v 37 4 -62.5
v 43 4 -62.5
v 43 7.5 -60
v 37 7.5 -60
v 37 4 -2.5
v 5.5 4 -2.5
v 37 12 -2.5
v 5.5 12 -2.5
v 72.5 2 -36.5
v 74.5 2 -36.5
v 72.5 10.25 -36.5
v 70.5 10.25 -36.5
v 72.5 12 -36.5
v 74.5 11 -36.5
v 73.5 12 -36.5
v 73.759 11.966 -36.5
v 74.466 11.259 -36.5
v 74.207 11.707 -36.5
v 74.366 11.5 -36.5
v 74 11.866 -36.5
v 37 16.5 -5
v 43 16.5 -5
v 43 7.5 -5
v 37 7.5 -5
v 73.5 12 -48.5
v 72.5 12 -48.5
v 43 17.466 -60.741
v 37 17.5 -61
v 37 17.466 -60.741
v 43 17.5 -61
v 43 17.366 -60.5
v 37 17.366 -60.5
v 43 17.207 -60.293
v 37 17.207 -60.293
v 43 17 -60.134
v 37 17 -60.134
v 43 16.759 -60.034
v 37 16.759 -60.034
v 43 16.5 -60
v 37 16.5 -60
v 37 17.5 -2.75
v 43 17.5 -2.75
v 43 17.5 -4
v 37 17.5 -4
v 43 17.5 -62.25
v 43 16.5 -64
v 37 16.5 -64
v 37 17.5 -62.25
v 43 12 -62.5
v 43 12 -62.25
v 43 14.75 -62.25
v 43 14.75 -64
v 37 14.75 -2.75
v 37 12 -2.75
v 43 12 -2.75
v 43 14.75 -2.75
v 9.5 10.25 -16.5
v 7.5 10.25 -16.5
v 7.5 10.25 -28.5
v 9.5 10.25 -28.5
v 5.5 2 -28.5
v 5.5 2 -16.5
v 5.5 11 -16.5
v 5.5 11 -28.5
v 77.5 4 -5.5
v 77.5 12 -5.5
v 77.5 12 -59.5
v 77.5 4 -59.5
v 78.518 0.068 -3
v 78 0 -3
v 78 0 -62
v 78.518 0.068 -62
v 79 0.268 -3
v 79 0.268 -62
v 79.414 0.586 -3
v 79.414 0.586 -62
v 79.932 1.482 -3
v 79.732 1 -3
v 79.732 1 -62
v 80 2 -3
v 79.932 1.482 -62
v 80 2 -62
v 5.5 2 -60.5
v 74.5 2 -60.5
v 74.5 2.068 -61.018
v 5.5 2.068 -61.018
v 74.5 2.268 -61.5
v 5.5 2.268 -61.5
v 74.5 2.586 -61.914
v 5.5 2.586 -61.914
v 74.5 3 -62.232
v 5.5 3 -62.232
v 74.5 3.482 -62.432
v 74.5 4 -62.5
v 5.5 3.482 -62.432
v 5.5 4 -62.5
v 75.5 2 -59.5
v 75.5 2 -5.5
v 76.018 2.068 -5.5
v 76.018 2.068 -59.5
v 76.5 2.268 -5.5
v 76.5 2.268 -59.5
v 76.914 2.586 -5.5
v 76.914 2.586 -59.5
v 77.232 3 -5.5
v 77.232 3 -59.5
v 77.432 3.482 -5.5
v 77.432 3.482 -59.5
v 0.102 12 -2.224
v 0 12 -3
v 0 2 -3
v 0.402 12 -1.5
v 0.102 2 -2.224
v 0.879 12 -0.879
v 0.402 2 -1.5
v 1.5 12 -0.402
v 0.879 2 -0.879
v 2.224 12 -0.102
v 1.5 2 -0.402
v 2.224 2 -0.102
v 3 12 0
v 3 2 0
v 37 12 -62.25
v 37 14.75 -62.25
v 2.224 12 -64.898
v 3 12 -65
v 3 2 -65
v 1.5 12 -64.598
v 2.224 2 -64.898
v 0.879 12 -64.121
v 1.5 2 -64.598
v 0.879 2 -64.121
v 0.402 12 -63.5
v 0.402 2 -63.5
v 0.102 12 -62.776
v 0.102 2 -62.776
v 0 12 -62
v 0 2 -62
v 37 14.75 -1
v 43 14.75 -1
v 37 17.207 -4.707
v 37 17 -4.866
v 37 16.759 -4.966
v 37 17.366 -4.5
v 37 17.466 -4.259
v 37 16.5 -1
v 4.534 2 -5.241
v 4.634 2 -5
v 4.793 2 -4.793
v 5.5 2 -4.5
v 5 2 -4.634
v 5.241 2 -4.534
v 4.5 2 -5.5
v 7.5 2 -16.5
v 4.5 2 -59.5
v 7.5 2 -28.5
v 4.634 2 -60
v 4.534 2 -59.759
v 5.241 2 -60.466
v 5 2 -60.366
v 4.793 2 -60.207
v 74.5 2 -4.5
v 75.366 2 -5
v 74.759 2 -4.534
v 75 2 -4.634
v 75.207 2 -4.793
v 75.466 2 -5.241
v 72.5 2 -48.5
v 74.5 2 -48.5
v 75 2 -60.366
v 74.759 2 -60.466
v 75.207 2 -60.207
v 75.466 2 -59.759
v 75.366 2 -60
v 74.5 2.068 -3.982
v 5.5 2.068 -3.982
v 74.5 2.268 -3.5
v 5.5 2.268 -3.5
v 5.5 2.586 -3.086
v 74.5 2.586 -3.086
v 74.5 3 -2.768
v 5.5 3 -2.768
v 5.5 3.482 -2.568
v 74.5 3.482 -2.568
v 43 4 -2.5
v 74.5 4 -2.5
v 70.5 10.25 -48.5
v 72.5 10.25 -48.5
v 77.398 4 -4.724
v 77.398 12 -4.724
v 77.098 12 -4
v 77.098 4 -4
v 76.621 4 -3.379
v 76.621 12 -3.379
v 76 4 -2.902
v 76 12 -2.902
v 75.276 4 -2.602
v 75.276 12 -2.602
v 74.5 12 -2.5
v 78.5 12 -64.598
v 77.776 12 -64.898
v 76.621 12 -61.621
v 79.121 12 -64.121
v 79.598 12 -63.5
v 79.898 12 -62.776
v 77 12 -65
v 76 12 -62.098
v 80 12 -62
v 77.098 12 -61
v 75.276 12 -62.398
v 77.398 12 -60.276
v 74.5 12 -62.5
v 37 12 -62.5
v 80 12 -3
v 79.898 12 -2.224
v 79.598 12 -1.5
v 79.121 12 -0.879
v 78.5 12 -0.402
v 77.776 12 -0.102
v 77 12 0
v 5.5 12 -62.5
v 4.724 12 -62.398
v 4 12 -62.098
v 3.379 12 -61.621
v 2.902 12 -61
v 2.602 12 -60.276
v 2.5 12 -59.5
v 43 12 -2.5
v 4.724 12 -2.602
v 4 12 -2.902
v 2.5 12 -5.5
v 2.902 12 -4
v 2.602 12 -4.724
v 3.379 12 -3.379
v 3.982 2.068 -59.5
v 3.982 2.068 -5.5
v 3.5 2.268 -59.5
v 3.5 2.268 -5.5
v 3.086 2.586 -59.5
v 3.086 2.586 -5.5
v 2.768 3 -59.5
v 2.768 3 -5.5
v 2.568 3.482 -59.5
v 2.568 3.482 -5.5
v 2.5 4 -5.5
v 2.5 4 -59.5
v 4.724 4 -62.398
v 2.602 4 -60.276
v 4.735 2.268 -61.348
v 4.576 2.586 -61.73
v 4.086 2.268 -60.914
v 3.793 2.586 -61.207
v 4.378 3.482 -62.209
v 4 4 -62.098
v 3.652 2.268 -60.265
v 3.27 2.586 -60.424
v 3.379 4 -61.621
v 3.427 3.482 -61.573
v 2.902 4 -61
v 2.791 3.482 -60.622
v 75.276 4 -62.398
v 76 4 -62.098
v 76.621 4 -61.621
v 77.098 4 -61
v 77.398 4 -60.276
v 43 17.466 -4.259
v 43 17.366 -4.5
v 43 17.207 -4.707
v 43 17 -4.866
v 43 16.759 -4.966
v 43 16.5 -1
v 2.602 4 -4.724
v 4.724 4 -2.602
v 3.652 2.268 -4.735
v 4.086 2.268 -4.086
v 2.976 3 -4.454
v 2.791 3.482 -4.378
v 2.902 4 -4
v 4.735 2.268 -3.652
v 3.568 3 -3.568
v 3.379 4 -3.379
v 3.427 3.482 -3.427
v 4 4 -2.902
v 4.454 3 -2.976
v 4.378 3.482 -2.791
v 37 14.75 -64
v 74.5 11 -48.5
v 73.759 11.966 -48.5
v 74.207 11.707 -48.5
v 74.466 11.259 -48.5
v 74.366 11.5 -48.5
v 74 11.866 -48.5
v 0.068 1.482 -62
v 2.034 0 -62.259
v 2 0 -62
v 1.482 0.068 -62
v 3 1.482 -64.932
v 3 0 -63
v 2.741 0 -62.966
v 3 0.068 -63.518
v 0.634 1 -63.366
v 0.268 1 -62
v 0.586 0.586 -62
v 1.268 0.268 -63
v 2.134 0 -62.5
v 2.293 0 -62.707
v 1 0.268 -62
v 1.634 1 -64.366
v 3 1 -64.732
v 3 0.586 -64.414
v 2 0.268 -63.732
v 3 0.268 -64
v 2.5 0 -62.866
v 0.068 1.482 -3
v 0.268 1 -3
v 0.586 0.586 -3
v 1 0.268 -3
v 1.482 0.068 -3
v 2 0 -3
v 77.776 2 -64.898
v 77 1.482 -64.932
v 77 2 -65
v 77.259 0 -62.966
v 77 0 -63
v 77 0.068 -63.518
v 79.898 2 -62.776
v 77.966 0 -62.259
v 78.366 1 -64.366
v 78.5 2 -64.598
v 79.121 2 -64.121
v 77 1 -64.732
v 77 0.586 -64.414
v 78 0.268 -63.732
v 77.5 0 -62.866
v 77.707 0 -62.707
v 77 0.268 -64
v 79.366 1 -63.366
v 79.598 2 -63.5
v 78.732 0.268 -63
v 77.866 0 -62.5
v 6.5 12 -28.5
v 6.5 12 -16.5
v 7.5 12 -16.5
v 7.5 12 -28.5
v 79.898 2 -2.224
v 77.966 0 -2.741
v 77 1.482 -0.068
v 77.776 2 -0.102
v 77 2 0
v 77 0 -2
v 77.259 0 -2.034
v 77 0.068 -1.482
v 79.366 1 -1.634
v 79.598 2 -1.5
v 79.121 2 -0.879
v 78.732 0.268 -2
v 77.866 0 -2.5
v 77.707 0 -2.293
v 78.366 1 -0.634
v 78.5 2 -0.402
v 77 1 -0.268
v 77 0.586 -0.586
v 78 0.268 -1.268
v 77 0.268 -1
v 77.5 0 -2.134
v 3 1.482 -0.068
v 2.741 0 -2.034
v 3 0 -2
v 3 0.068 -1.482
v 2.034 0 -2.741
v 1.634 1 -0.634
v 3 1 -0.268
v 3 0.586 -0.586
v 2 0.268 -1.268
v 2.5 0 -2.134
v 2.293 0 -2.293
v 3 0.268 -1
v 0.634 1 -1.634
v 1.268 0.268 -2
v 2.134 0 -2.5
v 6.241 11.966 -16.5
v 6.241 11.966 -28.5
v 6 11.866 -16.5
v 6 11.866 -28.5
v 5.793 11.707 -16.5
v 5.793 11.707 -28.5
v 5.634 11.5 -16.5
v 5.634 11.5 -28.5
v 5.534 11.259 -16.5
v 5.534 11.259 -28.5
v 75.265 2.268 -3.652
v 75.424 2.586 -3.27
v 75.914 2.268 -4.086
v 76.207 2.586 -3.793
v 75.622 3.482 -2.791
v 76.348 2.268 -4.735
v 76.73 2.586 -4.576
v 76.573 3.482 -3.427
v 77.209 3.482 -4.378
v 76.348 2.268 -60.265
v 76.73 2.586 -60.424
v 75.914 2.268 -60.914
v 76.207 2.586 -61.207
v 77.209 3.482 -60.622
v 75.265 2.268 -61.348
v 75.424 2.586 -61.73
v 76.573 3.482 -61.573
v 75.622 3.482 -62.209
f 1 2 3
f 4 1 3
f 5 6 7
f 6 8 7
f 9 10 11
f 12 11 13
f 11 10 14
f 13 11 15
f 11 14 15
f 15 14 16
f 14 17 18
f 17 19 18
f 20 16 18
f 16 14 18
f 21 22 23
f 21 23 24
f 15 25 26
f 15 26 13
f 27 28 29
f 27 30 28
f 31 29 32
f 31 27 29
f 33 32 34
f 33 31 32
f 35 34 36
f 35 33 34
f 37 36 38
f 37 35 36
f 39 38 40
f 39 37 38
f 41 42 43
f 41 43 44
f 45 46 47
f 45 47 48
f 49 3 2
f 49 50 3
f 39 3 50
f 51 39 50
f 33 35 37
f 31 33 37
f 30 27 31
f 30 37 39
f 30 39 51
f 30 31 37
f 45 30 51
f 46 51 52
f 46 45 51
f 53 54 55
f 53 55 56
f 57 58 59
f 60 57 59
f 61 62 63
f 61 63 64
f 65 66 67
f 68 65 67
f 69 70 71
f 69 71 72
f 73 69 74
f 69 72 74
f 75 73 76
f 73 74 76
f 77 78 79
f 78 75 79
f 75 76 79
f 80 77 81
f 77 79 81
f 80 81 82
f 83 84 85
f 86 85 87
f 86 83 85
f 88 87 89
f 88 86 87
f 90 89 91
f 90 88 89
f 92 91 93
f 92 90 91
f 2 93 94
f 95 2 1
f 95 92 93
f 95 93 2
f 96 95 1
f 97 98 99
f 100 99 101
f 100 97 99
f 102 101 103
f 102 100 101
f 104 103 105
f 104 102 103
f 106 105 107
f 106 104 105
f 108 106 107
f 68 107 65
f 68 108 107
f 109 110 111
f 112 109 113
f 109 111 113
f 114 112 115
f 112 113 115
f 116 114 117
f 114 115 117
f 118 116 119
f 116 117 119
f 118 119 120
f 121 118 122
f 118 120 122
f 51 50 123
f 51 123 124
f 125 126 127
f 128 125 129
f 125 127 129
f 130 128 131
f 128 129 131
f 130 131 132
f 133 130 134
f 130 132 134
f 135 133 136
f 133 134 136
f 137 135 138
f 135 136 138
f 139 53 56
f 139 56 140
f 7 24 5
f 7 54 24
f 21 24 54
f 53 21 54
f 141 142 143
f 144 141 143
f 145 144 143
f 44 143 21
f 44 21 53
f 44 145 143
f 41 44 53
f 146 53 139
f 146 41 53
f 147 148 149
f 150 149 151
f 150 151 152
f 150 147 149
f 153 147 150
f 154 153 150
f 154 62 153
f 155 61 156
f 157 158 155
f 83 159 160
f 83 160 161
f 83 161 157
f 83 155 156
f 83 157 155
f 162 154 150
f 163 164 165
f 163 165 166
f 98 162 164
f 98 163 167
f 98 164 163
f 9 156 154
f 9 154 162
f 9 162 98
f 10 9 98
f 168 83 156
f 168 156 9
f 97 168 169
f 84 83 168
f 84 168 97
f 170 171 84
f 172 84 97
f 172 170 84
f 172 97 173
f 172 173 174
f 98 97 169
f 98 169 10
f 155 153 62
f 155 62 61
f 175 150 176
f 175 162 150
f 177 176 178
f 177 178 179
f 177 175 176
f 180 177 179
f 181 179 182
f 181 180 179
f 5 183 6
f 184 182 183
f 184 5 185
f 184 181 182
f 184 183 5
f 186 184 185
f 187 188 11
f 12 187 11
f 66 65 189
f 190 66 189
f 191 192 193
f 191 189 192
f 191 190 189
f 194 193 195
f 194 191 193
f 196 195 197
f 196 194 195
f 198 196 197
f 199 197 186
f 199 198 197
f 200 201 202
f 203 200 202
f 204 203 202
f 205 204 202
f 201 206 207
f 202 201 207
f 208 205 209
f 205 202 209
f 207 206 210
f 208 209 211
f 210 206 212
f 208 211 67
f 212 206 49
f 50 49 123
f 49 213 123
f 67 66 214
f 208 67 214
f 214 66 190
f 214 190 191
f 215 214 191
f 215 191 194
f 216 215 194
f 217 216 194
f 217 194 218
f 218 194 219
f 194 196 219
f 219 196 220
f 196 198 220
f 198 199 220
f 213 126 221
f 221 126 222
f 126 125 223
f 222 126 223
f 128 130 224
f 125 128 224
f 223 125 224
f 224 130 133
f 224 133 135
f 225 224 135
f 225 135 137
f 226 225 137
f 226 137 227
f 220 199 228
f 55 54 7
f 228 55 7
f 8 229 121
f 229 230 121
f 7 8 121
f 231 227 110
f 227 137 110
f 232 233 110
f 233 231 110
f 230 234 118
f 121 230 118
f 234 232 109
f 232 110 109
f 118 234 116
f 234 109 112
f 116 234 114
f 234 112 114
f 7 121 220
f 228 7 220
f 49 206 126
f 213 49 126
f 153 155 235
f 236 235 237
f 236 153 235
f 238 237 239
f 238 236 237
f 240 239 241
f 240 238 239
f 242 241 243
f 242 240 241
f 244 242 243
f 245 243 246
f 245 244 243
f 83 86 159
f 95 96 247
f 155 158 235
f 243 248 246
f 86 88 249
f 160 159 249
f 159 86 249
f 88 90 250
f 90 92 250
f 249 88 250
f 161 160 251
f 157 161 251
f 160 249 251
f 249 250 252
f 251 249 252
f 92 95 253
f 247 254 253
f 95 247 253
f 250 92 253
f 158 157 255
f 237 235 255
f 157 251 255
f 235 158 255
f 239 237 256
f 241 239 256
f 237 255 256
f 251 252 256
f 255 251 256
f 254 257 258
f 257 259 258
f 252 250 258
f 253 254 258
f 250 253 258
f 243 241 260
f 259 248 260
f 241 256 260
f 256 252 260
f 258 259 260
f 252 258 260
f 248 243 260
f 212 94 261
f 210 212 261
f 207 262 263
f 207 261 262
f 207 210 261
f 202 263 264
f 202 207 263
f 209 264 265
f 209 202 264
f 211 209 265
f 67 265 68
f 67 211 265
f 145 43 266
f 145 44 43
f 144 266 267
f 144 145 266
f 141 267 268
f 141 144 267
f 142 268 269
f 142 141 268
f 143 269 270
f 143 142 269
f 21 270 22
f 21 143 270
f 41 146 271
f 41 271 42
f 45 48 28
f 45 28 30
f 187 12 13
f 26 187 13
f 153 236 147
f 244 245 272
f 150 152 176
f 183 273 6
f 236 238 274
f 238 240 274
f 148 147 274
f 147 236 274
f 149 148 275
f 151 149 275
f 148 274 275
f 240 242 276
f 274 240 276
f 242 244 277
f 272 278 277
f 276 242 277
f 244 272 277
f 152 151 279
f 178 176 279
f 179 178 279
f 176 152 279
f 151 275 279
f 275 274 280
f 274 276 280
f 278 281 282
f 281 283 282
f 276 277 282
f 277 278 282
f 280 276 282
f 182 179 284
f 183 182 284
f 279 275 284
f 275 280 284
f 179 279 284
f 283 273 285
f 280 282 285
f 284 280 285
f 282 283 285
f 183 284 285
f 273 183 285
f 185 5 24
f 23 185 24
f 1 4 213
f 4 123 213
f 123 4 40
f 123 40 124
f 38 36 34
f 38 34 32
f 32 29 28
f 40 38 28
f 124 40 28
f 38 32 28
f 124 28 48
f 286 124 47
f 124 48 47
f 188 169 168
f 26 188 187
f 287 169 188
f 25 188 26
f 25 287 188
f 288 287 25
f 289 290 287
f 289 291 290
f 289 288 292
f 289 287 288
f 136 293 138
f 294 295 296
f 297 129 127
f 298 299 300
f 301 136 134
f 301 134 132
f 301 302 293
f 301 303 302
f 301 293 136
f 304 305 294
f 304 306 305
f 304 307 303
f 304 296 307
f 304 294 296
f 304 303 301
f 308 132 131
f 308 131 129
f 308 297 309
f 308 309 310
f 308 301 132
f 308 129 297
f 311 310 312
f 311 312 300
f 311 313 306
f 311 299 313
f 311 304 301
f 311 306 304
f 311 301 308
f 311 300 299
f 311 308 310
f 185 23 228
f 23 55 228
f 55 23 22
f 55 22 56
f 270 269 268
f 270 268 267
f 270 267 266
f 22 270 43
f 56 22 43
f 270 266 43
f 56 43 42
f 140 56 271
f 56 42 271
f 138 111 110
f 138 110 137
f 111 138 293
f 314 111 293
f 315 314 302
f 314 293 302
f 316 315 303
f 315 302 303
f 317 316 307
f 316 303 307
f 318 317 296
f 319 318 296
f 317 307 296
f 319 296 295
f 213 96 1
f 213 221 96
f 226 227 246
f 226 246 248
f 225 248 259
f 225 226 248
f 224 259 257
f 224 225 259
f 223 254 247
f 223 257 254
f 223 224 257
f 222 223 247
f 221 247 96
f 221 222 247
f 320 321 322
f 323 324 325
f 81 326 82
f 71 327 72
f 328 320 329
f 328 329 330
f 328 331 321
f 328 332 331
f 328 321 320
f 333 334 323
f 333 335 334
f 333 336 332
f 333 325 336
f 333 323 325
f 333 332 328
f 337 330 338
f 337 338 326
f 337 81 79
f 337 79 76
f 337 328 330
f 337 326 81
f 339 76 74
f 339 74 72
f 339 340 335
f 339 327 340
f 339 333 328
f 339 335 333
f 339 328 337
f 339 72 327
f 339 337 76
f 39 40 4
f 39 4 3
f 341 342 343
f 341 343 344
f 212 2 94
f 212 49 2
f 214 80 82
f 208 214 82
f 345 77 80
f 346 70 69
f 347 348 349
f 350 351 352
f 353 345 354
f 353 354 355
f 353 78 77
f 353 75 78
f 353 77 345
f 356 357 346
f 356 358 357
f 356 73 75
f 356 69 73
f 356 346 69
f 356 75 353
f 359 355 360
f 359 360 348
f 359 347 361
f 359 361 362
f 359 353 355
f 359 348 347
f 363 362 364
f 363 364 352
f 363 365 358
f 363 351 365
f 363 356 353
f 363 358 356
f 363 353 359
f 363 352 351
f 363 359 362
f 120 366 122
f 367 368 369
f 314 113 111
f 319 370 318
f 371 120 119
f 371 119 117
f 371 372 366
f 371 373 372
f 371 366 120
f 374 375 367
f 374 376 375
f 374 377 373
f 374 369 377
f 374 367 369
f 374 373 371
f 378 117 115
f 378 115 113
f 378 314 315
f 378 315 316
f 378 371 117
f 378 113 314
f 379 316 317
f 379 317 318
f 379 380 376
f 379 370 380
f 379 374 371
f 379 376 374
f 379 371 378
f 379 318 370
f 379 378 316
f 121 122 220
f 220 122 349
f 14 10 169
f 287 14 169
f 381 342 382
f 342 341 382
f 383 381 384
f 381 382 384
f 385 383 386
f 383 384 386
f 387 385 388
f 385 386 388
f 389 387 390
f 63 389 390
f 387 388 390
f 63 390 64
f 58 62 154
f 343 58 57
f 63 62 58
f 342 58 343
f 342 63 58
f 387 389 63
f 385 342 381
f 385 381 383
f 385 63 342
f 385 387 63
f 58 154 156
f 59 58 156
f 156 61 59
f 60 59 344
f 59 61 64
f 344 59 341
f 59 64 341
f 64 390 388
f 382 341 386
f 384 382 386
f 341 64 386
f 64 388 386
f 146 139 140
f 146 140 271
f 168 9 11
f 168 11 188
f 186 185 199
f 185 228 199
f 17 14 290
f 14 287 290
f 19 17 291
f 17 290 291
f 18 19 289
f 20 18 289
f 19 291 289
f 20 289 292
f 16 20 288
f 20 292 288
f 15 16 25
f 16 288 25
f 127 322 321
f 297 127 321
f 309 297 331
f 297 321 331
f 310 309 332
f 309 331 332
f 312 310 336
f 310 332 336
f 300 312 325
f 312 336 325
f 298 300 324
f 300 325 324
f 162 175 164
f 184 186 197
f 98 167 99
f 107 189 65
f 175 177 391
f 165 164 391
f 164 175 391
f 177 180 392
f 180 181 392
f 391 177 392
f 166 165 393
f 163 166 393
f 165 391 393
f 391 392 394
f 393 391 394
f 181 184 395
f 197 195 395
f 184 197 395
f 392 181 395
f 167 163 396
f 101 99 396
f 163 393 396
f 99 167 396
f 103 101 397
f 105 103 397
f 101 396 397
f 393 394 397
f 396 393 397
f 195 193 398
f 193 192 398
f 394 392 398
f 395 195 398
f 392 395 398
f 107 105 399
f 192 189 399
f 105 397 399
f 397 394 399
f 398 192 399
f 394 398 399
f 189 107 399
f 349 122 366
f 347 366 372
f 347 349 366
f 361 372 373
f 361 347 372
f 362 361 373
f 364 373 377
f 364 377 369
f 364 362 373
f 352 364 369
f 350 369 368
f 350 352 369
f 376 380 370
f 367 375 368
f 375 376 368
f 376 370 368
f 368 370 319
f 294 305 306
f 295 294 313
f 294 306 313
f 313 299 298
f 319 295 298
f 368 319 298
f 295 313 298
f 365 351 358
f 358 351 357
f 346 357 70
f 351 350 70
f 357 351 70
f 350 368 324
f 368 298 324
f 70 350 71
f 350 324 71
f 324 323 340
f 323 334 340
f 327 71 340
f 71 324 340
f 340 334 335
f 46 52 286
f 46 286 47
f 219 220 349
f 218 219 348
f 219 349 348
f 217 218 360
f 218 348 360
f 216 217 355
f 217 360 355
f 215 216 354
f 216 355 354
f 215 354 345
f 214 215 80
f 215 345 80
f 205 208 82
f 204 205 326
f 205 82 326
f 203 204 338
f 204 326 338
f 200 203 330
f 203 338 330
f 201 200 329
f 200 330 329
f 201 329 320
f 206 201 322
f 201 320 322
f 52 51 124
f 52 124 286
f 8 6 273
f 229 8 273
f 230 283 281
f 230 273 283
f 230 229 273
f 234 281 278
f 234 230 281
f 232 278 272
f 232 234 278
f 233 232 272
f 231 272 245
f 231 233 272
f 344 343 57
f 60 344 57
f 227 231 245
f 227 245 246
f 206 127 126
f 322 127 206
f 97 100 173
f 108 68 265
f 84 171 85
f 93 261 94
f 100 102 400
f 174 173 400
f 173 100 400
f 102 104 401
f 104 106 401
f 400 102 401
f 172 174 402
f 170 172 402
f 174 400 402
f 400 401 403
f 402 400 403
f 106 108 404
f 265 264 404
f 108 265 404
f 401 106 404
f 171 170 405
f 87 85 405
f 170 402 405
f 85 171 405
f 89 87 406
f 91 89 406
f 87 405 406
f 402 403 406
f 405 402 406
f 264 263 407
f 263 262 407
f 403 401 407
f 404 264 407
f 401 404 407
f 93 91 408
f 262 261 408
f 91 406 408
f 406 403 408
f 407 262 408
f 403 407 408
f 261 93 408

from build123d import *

# Parameters (mm, degrees)
SKETCH1_W            = 80
SKETCH1_H            = 65
BOSS_EXTRUDE1_DEPTH  = 12
SKETCH2_W            = 75
SKETCH2_H            = 60
CUT_EXTRUDE1_DEPTH   = 10
FILLET4_R            = 2
FILLET5_R            = 3
FILLET8_R            = 2
SKETCH5_W            = 6
SKETCH5_H            = 13.5
BOSS_EXTRUDE2_DEPTH  = 2.5
CUT_EXTRUDE3_REACH   = 81.876
SKETCH6_W            = 0.25
SKETCH6_H            = 5.5
BOSS_EXTRUDE3_DEPTH  = 6
CUT_EXTRUDE4_REACH   = 81.876
SKETCH10_W           = 6
SKETCH10_H           = 13.5
BOSS_EXTRUDE4_DEPTH  = 2.5
CUT_EXTRUDE5_REACH   = 81.876
SKETCH11_W           = 0.25
SKETCH11_H           = 5.5
BOSS_EXTRUDE5_DEPTH  = 6
CUT_EXTRUDE6_DEPTH   = 6
SKETCH14_W           = 2
SKETCH14_H           = 12
BOSS_EXTRUDE7_DEPTH  = 10
SKETCH15_W           = 12
SKETCH15_H           = 1.75
BOSS_EXTRUDE8_DEPTH  = 2
SKETCH16_W           = 2
SKETCH16_H           = 12
BOSS_EXTRUDE9_DEPTH  = 10
SKETCH17_W           = 12
SKETCH17_H           = 1.75
BOSS_EXTRUDE10_DEPTH = 2
FILLET9_R            = 1
CUT_EXTRUDE7_REACH   = 97.176
CUT_EXTRUDE8_REACH   = 91.658


with BuildPart() as part:
    # Sketch1 → Boss-Extrude1 (new body)
    with BuildSketch(Plane(origin=(0, 0, 0), x_dir=(1, 0, 0), z_dir=(0, 1, 0))):
        with Locations((40, 32.5)):
            Rectangle(SKETCH1_W, SKETCH1_H)
    extrude(amount=BOSS_EXTRUDE1_DEPTH)

    # Sketch2 → Cut-Extrude1 (cut)
    with BuildSketch(Plane(origin=(0, 12, 0), x_dir=(1, 0, 0), z_dir=(0, 1, 0))):
        with Locations((40, 32.5)):
            Rectangle(SKETCH2_W, SKETCH2_H)
    extrude(amount=-CUT_EXTRUDE1_DEPTH, mode=Mode.SUBTRACT)

    # Fillet4
    fillet4_edges = [part.edges().sort_by_distance(p)[0] for p in [
        (40, 0, -65),
        (80, 0, -32.5),
        (40, 0, 0),
        (0, 0, -32.5),
    ]]
    fillet(fillet4_edges, radius=FILLET4_R)

    # Fillet5
    # the kernel refuses this fillet: 3 mm, written as the material it adds along each edge
    with BuildSketch(Plane(origin=(2.5, 12, -2.5), x_dir=(0, 0, -1), z_dir=(0, -1, 0)), Plane(origin=(77.5, 12, -62.5), x_dir=(0, 0, 1), z_dir=(0, -1, 0)), Plane(origin=(77.5, 12, -2.5), x_dir=(-1, 0, 0), z_dir=(0, -1, 0))) as fillet5_piece_1:
        with BuildLine():
            CenterArc((FILLET5_R, FILLET5_R), FILLET5_R, 180, 90)
            Line((0, FILLET5_R), (0, 0))
            Line((0, 0), (FILLET5_R, 0))
        make_face()
    extrude(amount=10)
    with BuildSketch(Plane(origin=(2.5, 12, -62.5), x_dir=(0, 0, 1), z_dir=(0, -1, 0))) as fillet5_piece_2:
        with BuildLine():
            CenterArc((FILLET5_R, -FILLET5_R), FILLET5_R, 90, 90)
            Line((0, -FILLET5_R), (0, 0))
            Line((0, 0), (FILLET5_R, 0))
        make_face()
    extrude(amount=10)
    # the kernel refuses this fillet: 3 mm, written as the material it takes off along each edge
    with BuildSketch(Plane(origin=(77, 0, -62), x_dir=(0, 0, -1), z_dir=(-1, 0, 0))) as fillet5_2_piece_1:
        with BuildLine():
            CenterArc((1, -2), 2, 0, 90)
            Line((3, -2), (3, 0))
            Line((3, 0), (1, 0))
        make_face()
    revolve(axis=Axis((77, 0, -62), (0, -1, 0)), revolution_arc=90, mode=Mode.SUBTRACT)
    with BuildSketch(Plane(origin=(77, 0, -3), x_dir=(1, 0, 0), z_dir=(0, 0, -1))) as fillet5_2_piece_2:
        with BuildLine():
            CenterArc((1, -2), 2, 0, 90)
            Line((3, -2), (3, 0))
            Line((3, 0), (1, 0))
        make_face()
    revolve(axis=Axis((77, 0, -3), (0, -1, 0)), revolution_arc=90, mode=Mode.SUBTRACT)
    with BuildSketch(Plane(origin=(3, 0, -62), x_dir=(-1, 0, 0), z_dir=(0, 0, 1))) as fillet5_2_piece_3:
        with BuildLine():
            CenterArc((1, -2), 2, 0, 90)
            Line((3, -2), (3, 0))
            Line((3, 0), (1, 0))
        make_face()
    revolve(axis=Axis((3, 0, -62), (0, -1, 0)), revolution_arc=90, mode=Mode.SUBTRACT)
    with BuildSketch(Plane(origin=(3, 0, -3), x_dir=(0, 0, 1), z_dir=(1, 0, 0))) as fillet5_2_piece_4:
        with BuildLine():
            CenterArc((1, -2), 2, 0, 90)
            Line((3, -2), (3, 0))
            Line((3, 0), (1, 0))
        make_face()
    revolve(axis=Axis((3, 0, -3), (0, -1, 0)), revolution_arc=90, mode=Mode.SUBTRACT)
    with BuildSketch(Plane(origin=(0, 0, -65), x_dir=(0, 0, 1), z_dir=(0, 1, 0)), Plane(origin=(0, 0, 0), x_dir=(1, 0, 0), z_dir=(0, 1, 0))) as fillet5_2_piece_5:
        with BuildLine():
            CenterArc((FILLET5_R, FILLET5_R), FILLET5_R, 180, 90)
            Line((0, FILLET5_R), (0, 0))
            Line((0, 0), (FILLET5_R, 0))
        make_face()
    extrude(amount=19.5, mode=Mode.SUBTRACT)
    with BuildSketch(Plane(origin=(80, 0, -65), x_dir=(0, 0, 1), z_dir=(0, 1, 0)), Plane(origin=(80, 0, 0), x_dir=(-1, 0, 0), z_dir=(0, 1, 0))) as fillet5_2_piece_6:
        with BuildLine():
            CenterArc((FILLET5_R, -FILLET5_R), FILLET5_R, 90, 90)
            Line((0, -FILLET5_R), (0, 0))
            Line((0, 0), (FILLET5_R, 0))
        make_face()
    extrude(amount=19.5, mode=Mode.SUBTRACT)

    # Fillet8
    fillet8_edges = [part.edges().sort_by_distance(p)[0] for p in [
        (40, 2, -2.5),
        (2.5, 2, -32.5),
        (77.5, 2, -32.5),
        (40, 2, -62.5),
        (3.378679656, 2, -61.621320344),
        (76.621320344, 2, -61.621320344),
        (76.621320344, 2, -3.378679656),
        (3.378679656, 2, -3.378679656),
    ]]
    fillet(fillet8_edges, radius=FILLET8_R)

    # Sketch5 → Boss-Extrude2 (add)
    with BuildSketch(Plane.XY.offset(-62.5)):
        with Locations((40, 10.75)):
            Rectangle(SKETCH5_W, SKETCH5_H)
    extrude(amount=BOSS_EXTRUDE2_DEPTH)

    # Sketch6 → Cut-Extrude3 (cut, up to next)
    with BuildSketch(Plane(origin=(43, 0, 0), x_dir=(0, 0, -1), z_dir=(1, 0, 0)), mode=Mode.PRIVATE) as cut_extrude3_sk1:
        with Locations((62.375, 14.75)):
            Rectangle(SKETCH6_W, SKETCH6_H)
    cut_extrude3_tool1 = extrude(cut_extrude3_sk1.sketch, amount=-CUT_EXTRUDE3_REACH, mode=Mode.PRIVATE) & part.part
    add(cut_extrude3_tool1.solids().sort_by_distance((43, 14.75, -62.375))[0], mode=Mode.SUBTRACT)

    # Sketch7 → Boss-Extrude3 (add)
    with BuildSketch(Plane(origin=(43, 0, 0), x_dir=(0, 0, -1), z_dir=(1, 0, 0))):
        Polygon((62.25, 14.75), (64, 14.75), (64, 16.5), (62.25, 17.5), align=None)
    extrude(amount=-BOSS_EXTRUDE3_DEPTH)

    # Sketch8 → Cut-Extrude4 (cut, up to next)
    with BuildSketch(Plane(origin=(43, 0, 0), x_dir=(0, 0, -1), z_dir=(1, 0, 0)), mode=Mode.PRIVATE) as cut_extrude4_sk1:
        Polygon((60, 4), (62.5, 4), (60, 7.5), align=None)
    cut_extrude4_tool1 = extrude(cut_extrude4_sk1.sketch, amount=-CUT_EXTRUDE4_REACH, mode=Mode.PRIVATE) & part.part
    add(cut_extrude4_tool1.solids().sort_by_distance((43, 5.166667, -60.833333))[0], mode=Mode.SUBTRACT)

    # Sketch10 → Boss-Extrude4 (add)
    with BuildSketch(Plane(origin=(0, 0, -2.5), x_dir=(-1, 0, 0), z_dir=(0, 0, -1))):
        with Locations((-40, 10.75)):
            Rectangle(SKETCH10_W, SKETCH10_H)
    extrude(amount=BOSS_EXTRUDE4_DEPTH)

    # Sketch11 → Cut-Extrude5 (cut, up to next)
    with BuildSketch(Plane.ZY.offset(-37), mode=Mode.PRIVATE) as cut_extrude5_sk1:
        with Locations((-2.625, 14.75)):
            Rectangle(SKETCH11_W, SKETCH11_H)
    cut_extrude5_tool1 = extrude(cut_extrude5_sk1.sketch, amount=-CUT_EXTRUDE5_REACH, mode=Mode.PRIVATE) & part.part
    add(cut_extrude5_tool1.solids().sort_by_distance((37, 14.75, -2.625))[0], mode=Mode.SUBTRACT)

    # Sketch12 → Boss-Extrude5 (add)
    with BuildSketch(Plane.ZY.offset(-37)):
        Polygon((-2.75, 14.75), (-1, 14.75), (-1, 16.5), (-2.75, 17.5), align=None)
    extrude(amount=-BOSS_EXTRUDE5_DEPTH)

    # Sketch13 → Cut-Extrude6 (cut)
    with BuildSketch(Plane.ZY.offset(-37)):
        Polygon((-5, 4), (-2.5, 4), (-5, 7.5), align=None)
    extrude(amount=-CUT_EXTRUDE6_DEPTH, mode=Mode.SUBTRACT)

    # Sketch14 → Boss-Extrude7 (add)
    with BuildSketch(Plane(origin=(0, 2, 0), x_dir=(1, 0, 0), z_dir=(0, 1, 0))):
        with Locations((6.5, 22.5)):
            Rectangle(SKETCH14_W, SKETCH14_H)
    extrude(amount=BOSS_EXTRUDE7_DEPTH)

    # Sketch15 → Boss-Extrude8 (add)
    with BuildSketch(Plane(origin=(7.5, 0, 0), x_dir=(0, 0, -1), z_dir=(1, 0, 0))):
        with Locations((22.5, 11.125)):
            Rectangle(SKETCH15_W, SKETCH15_H)
    extrude(amount=BOSS_EXTRUDE8_DEPTH)

    # Sketch16 → Boss-Extrude9 (add)
    with BuildSketch(Plane(origin=(0, 2, 0), x_dir=(1, 0, 0), z_dir=(0, 1, 0))):
        with Locations((73.5, 42.5)):
            Rectangle(SKETCH16_W, SKETCH16_H)
    extrude(amount=BOSS_EXTRUDE9_DEPTH)

    # Sketch17 → Boss-Extrude10 (add)
    with BuildSketch(Plane.ZY.offset(-72.5)):
        with Locations((-42.5, 11.125)):
            Rectangle(SKETCH17_W, SKETCH17_H)
    extrude(amount=BOSS_EXTRUDE10_DEPTH)

    # Fillet9
    fillet9_edges = [part.edges().sort_by_distance(p)[0] for p in [
        (40, 17.5, -60),
        (40, 17.5, -5),
        (5.5, 12, -22.5),
        (74.5, 12, -42.5),
    ]]
    fillet(fillet9_edges, radius=FILLET9_R)

    # Sketch18 → Cut-Extrude7 (cut, up to next)
    with BuildSketch(Plane.XY.offset(-16.5), mode=Mode.PRIVATE) as cut_extrude7_sk1:
        Polygon((7.5, 12), (9.5, 10.25), (9.5, 12), align=None)
    cut_extrude7_tool1 = extrude(cut_extrude7_sk1.sketch, amount=-CUT_EXTRUDE7_REACH, mode=Mode.PRIVATE) & part.part
    add(cut_extrude7_tool1.solids().sort_by_distance((8.833333, 11.416667, -16.5))[0], mode=Mode.SUBTRACT)

    # Sketch19 → Cut-Extrude8 (cut, up to next)
    with BuildSketch(Plane.XY.offset(-36.5), mode=Mode.PRIVATE) as cut_extrude8_sk1:
        Polygon((70.5, 10.25), (72.5, 12), (70.5, 12), align=None)
    cut_extrude8_tool1 = extrude(cut_extrude8_sk1.sketch, amount=-CUT_EXTRUDE8_REACH, mode=Mode.PRIVATE) & part.part
    add(cut_extrude8_tool1.solids().sort_by_distance((71.166667, 11.416667, -36.5))[0], mode=Mode.SUBTRACT)


solid = part.part
